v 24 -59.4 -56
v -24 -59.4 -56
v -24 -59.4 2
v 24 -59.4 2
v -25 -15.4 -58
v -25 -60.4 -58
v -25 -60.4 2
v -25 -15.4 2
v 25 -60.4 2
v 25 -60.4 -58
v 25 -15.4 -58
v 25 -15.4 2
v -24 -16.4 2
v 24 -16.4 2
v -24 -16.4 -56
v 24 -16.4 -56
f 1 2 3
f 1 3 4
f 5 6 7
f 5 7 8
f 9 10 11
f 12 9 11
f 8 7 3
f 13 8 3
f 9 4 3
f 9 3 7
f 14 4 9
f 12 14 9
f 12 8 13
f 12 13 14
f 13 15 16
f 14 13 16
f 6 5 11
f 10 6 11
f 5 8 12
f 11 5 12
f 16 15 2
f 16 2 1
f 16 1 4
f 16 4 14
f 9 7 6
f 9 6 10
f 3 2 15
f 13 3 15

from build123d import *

# Parameters (mm, degrees)
SKETCH004_W  = 48
SKETCH004_H  = 43
PAD012_DEPTH = 60
SKETCH003_W  = 50
SKETCH003_H  = 45
PAD011_DEPTH = 60


with BuildPart() as body004:
    # Sketch004 → Pad012 (new body)
    with BuildSketch(Plane.XY.offset(-39)):
        Rectangle(SKETCH004_W, SKETCH004_H)
    extrude(amount=PAD012_DEPTH)


with BuildPart() as body004_1:
    # Body004 placement: moved
    add(body004.part.moved(Location((0, -37.9, -17))))


with BuildPart() as cut:
    # Sketch003 → Pad011 (new body)
    with BuildSketch(Plane.XY.offset(-40)):
        Rectangle(SKETCH003_W, SKETCH003_H)
    extrude(amount=PAD011_DEPTH)


with BuildPart() as cut_1:
    # Body003 placement: moved
    add(cut.part.moved(Location((0, -37.9, -18))))

    # Cut: cut Body004
    add(body004_1.part, mode=Mode.SUBTRACT)


solid = cut_1.part
